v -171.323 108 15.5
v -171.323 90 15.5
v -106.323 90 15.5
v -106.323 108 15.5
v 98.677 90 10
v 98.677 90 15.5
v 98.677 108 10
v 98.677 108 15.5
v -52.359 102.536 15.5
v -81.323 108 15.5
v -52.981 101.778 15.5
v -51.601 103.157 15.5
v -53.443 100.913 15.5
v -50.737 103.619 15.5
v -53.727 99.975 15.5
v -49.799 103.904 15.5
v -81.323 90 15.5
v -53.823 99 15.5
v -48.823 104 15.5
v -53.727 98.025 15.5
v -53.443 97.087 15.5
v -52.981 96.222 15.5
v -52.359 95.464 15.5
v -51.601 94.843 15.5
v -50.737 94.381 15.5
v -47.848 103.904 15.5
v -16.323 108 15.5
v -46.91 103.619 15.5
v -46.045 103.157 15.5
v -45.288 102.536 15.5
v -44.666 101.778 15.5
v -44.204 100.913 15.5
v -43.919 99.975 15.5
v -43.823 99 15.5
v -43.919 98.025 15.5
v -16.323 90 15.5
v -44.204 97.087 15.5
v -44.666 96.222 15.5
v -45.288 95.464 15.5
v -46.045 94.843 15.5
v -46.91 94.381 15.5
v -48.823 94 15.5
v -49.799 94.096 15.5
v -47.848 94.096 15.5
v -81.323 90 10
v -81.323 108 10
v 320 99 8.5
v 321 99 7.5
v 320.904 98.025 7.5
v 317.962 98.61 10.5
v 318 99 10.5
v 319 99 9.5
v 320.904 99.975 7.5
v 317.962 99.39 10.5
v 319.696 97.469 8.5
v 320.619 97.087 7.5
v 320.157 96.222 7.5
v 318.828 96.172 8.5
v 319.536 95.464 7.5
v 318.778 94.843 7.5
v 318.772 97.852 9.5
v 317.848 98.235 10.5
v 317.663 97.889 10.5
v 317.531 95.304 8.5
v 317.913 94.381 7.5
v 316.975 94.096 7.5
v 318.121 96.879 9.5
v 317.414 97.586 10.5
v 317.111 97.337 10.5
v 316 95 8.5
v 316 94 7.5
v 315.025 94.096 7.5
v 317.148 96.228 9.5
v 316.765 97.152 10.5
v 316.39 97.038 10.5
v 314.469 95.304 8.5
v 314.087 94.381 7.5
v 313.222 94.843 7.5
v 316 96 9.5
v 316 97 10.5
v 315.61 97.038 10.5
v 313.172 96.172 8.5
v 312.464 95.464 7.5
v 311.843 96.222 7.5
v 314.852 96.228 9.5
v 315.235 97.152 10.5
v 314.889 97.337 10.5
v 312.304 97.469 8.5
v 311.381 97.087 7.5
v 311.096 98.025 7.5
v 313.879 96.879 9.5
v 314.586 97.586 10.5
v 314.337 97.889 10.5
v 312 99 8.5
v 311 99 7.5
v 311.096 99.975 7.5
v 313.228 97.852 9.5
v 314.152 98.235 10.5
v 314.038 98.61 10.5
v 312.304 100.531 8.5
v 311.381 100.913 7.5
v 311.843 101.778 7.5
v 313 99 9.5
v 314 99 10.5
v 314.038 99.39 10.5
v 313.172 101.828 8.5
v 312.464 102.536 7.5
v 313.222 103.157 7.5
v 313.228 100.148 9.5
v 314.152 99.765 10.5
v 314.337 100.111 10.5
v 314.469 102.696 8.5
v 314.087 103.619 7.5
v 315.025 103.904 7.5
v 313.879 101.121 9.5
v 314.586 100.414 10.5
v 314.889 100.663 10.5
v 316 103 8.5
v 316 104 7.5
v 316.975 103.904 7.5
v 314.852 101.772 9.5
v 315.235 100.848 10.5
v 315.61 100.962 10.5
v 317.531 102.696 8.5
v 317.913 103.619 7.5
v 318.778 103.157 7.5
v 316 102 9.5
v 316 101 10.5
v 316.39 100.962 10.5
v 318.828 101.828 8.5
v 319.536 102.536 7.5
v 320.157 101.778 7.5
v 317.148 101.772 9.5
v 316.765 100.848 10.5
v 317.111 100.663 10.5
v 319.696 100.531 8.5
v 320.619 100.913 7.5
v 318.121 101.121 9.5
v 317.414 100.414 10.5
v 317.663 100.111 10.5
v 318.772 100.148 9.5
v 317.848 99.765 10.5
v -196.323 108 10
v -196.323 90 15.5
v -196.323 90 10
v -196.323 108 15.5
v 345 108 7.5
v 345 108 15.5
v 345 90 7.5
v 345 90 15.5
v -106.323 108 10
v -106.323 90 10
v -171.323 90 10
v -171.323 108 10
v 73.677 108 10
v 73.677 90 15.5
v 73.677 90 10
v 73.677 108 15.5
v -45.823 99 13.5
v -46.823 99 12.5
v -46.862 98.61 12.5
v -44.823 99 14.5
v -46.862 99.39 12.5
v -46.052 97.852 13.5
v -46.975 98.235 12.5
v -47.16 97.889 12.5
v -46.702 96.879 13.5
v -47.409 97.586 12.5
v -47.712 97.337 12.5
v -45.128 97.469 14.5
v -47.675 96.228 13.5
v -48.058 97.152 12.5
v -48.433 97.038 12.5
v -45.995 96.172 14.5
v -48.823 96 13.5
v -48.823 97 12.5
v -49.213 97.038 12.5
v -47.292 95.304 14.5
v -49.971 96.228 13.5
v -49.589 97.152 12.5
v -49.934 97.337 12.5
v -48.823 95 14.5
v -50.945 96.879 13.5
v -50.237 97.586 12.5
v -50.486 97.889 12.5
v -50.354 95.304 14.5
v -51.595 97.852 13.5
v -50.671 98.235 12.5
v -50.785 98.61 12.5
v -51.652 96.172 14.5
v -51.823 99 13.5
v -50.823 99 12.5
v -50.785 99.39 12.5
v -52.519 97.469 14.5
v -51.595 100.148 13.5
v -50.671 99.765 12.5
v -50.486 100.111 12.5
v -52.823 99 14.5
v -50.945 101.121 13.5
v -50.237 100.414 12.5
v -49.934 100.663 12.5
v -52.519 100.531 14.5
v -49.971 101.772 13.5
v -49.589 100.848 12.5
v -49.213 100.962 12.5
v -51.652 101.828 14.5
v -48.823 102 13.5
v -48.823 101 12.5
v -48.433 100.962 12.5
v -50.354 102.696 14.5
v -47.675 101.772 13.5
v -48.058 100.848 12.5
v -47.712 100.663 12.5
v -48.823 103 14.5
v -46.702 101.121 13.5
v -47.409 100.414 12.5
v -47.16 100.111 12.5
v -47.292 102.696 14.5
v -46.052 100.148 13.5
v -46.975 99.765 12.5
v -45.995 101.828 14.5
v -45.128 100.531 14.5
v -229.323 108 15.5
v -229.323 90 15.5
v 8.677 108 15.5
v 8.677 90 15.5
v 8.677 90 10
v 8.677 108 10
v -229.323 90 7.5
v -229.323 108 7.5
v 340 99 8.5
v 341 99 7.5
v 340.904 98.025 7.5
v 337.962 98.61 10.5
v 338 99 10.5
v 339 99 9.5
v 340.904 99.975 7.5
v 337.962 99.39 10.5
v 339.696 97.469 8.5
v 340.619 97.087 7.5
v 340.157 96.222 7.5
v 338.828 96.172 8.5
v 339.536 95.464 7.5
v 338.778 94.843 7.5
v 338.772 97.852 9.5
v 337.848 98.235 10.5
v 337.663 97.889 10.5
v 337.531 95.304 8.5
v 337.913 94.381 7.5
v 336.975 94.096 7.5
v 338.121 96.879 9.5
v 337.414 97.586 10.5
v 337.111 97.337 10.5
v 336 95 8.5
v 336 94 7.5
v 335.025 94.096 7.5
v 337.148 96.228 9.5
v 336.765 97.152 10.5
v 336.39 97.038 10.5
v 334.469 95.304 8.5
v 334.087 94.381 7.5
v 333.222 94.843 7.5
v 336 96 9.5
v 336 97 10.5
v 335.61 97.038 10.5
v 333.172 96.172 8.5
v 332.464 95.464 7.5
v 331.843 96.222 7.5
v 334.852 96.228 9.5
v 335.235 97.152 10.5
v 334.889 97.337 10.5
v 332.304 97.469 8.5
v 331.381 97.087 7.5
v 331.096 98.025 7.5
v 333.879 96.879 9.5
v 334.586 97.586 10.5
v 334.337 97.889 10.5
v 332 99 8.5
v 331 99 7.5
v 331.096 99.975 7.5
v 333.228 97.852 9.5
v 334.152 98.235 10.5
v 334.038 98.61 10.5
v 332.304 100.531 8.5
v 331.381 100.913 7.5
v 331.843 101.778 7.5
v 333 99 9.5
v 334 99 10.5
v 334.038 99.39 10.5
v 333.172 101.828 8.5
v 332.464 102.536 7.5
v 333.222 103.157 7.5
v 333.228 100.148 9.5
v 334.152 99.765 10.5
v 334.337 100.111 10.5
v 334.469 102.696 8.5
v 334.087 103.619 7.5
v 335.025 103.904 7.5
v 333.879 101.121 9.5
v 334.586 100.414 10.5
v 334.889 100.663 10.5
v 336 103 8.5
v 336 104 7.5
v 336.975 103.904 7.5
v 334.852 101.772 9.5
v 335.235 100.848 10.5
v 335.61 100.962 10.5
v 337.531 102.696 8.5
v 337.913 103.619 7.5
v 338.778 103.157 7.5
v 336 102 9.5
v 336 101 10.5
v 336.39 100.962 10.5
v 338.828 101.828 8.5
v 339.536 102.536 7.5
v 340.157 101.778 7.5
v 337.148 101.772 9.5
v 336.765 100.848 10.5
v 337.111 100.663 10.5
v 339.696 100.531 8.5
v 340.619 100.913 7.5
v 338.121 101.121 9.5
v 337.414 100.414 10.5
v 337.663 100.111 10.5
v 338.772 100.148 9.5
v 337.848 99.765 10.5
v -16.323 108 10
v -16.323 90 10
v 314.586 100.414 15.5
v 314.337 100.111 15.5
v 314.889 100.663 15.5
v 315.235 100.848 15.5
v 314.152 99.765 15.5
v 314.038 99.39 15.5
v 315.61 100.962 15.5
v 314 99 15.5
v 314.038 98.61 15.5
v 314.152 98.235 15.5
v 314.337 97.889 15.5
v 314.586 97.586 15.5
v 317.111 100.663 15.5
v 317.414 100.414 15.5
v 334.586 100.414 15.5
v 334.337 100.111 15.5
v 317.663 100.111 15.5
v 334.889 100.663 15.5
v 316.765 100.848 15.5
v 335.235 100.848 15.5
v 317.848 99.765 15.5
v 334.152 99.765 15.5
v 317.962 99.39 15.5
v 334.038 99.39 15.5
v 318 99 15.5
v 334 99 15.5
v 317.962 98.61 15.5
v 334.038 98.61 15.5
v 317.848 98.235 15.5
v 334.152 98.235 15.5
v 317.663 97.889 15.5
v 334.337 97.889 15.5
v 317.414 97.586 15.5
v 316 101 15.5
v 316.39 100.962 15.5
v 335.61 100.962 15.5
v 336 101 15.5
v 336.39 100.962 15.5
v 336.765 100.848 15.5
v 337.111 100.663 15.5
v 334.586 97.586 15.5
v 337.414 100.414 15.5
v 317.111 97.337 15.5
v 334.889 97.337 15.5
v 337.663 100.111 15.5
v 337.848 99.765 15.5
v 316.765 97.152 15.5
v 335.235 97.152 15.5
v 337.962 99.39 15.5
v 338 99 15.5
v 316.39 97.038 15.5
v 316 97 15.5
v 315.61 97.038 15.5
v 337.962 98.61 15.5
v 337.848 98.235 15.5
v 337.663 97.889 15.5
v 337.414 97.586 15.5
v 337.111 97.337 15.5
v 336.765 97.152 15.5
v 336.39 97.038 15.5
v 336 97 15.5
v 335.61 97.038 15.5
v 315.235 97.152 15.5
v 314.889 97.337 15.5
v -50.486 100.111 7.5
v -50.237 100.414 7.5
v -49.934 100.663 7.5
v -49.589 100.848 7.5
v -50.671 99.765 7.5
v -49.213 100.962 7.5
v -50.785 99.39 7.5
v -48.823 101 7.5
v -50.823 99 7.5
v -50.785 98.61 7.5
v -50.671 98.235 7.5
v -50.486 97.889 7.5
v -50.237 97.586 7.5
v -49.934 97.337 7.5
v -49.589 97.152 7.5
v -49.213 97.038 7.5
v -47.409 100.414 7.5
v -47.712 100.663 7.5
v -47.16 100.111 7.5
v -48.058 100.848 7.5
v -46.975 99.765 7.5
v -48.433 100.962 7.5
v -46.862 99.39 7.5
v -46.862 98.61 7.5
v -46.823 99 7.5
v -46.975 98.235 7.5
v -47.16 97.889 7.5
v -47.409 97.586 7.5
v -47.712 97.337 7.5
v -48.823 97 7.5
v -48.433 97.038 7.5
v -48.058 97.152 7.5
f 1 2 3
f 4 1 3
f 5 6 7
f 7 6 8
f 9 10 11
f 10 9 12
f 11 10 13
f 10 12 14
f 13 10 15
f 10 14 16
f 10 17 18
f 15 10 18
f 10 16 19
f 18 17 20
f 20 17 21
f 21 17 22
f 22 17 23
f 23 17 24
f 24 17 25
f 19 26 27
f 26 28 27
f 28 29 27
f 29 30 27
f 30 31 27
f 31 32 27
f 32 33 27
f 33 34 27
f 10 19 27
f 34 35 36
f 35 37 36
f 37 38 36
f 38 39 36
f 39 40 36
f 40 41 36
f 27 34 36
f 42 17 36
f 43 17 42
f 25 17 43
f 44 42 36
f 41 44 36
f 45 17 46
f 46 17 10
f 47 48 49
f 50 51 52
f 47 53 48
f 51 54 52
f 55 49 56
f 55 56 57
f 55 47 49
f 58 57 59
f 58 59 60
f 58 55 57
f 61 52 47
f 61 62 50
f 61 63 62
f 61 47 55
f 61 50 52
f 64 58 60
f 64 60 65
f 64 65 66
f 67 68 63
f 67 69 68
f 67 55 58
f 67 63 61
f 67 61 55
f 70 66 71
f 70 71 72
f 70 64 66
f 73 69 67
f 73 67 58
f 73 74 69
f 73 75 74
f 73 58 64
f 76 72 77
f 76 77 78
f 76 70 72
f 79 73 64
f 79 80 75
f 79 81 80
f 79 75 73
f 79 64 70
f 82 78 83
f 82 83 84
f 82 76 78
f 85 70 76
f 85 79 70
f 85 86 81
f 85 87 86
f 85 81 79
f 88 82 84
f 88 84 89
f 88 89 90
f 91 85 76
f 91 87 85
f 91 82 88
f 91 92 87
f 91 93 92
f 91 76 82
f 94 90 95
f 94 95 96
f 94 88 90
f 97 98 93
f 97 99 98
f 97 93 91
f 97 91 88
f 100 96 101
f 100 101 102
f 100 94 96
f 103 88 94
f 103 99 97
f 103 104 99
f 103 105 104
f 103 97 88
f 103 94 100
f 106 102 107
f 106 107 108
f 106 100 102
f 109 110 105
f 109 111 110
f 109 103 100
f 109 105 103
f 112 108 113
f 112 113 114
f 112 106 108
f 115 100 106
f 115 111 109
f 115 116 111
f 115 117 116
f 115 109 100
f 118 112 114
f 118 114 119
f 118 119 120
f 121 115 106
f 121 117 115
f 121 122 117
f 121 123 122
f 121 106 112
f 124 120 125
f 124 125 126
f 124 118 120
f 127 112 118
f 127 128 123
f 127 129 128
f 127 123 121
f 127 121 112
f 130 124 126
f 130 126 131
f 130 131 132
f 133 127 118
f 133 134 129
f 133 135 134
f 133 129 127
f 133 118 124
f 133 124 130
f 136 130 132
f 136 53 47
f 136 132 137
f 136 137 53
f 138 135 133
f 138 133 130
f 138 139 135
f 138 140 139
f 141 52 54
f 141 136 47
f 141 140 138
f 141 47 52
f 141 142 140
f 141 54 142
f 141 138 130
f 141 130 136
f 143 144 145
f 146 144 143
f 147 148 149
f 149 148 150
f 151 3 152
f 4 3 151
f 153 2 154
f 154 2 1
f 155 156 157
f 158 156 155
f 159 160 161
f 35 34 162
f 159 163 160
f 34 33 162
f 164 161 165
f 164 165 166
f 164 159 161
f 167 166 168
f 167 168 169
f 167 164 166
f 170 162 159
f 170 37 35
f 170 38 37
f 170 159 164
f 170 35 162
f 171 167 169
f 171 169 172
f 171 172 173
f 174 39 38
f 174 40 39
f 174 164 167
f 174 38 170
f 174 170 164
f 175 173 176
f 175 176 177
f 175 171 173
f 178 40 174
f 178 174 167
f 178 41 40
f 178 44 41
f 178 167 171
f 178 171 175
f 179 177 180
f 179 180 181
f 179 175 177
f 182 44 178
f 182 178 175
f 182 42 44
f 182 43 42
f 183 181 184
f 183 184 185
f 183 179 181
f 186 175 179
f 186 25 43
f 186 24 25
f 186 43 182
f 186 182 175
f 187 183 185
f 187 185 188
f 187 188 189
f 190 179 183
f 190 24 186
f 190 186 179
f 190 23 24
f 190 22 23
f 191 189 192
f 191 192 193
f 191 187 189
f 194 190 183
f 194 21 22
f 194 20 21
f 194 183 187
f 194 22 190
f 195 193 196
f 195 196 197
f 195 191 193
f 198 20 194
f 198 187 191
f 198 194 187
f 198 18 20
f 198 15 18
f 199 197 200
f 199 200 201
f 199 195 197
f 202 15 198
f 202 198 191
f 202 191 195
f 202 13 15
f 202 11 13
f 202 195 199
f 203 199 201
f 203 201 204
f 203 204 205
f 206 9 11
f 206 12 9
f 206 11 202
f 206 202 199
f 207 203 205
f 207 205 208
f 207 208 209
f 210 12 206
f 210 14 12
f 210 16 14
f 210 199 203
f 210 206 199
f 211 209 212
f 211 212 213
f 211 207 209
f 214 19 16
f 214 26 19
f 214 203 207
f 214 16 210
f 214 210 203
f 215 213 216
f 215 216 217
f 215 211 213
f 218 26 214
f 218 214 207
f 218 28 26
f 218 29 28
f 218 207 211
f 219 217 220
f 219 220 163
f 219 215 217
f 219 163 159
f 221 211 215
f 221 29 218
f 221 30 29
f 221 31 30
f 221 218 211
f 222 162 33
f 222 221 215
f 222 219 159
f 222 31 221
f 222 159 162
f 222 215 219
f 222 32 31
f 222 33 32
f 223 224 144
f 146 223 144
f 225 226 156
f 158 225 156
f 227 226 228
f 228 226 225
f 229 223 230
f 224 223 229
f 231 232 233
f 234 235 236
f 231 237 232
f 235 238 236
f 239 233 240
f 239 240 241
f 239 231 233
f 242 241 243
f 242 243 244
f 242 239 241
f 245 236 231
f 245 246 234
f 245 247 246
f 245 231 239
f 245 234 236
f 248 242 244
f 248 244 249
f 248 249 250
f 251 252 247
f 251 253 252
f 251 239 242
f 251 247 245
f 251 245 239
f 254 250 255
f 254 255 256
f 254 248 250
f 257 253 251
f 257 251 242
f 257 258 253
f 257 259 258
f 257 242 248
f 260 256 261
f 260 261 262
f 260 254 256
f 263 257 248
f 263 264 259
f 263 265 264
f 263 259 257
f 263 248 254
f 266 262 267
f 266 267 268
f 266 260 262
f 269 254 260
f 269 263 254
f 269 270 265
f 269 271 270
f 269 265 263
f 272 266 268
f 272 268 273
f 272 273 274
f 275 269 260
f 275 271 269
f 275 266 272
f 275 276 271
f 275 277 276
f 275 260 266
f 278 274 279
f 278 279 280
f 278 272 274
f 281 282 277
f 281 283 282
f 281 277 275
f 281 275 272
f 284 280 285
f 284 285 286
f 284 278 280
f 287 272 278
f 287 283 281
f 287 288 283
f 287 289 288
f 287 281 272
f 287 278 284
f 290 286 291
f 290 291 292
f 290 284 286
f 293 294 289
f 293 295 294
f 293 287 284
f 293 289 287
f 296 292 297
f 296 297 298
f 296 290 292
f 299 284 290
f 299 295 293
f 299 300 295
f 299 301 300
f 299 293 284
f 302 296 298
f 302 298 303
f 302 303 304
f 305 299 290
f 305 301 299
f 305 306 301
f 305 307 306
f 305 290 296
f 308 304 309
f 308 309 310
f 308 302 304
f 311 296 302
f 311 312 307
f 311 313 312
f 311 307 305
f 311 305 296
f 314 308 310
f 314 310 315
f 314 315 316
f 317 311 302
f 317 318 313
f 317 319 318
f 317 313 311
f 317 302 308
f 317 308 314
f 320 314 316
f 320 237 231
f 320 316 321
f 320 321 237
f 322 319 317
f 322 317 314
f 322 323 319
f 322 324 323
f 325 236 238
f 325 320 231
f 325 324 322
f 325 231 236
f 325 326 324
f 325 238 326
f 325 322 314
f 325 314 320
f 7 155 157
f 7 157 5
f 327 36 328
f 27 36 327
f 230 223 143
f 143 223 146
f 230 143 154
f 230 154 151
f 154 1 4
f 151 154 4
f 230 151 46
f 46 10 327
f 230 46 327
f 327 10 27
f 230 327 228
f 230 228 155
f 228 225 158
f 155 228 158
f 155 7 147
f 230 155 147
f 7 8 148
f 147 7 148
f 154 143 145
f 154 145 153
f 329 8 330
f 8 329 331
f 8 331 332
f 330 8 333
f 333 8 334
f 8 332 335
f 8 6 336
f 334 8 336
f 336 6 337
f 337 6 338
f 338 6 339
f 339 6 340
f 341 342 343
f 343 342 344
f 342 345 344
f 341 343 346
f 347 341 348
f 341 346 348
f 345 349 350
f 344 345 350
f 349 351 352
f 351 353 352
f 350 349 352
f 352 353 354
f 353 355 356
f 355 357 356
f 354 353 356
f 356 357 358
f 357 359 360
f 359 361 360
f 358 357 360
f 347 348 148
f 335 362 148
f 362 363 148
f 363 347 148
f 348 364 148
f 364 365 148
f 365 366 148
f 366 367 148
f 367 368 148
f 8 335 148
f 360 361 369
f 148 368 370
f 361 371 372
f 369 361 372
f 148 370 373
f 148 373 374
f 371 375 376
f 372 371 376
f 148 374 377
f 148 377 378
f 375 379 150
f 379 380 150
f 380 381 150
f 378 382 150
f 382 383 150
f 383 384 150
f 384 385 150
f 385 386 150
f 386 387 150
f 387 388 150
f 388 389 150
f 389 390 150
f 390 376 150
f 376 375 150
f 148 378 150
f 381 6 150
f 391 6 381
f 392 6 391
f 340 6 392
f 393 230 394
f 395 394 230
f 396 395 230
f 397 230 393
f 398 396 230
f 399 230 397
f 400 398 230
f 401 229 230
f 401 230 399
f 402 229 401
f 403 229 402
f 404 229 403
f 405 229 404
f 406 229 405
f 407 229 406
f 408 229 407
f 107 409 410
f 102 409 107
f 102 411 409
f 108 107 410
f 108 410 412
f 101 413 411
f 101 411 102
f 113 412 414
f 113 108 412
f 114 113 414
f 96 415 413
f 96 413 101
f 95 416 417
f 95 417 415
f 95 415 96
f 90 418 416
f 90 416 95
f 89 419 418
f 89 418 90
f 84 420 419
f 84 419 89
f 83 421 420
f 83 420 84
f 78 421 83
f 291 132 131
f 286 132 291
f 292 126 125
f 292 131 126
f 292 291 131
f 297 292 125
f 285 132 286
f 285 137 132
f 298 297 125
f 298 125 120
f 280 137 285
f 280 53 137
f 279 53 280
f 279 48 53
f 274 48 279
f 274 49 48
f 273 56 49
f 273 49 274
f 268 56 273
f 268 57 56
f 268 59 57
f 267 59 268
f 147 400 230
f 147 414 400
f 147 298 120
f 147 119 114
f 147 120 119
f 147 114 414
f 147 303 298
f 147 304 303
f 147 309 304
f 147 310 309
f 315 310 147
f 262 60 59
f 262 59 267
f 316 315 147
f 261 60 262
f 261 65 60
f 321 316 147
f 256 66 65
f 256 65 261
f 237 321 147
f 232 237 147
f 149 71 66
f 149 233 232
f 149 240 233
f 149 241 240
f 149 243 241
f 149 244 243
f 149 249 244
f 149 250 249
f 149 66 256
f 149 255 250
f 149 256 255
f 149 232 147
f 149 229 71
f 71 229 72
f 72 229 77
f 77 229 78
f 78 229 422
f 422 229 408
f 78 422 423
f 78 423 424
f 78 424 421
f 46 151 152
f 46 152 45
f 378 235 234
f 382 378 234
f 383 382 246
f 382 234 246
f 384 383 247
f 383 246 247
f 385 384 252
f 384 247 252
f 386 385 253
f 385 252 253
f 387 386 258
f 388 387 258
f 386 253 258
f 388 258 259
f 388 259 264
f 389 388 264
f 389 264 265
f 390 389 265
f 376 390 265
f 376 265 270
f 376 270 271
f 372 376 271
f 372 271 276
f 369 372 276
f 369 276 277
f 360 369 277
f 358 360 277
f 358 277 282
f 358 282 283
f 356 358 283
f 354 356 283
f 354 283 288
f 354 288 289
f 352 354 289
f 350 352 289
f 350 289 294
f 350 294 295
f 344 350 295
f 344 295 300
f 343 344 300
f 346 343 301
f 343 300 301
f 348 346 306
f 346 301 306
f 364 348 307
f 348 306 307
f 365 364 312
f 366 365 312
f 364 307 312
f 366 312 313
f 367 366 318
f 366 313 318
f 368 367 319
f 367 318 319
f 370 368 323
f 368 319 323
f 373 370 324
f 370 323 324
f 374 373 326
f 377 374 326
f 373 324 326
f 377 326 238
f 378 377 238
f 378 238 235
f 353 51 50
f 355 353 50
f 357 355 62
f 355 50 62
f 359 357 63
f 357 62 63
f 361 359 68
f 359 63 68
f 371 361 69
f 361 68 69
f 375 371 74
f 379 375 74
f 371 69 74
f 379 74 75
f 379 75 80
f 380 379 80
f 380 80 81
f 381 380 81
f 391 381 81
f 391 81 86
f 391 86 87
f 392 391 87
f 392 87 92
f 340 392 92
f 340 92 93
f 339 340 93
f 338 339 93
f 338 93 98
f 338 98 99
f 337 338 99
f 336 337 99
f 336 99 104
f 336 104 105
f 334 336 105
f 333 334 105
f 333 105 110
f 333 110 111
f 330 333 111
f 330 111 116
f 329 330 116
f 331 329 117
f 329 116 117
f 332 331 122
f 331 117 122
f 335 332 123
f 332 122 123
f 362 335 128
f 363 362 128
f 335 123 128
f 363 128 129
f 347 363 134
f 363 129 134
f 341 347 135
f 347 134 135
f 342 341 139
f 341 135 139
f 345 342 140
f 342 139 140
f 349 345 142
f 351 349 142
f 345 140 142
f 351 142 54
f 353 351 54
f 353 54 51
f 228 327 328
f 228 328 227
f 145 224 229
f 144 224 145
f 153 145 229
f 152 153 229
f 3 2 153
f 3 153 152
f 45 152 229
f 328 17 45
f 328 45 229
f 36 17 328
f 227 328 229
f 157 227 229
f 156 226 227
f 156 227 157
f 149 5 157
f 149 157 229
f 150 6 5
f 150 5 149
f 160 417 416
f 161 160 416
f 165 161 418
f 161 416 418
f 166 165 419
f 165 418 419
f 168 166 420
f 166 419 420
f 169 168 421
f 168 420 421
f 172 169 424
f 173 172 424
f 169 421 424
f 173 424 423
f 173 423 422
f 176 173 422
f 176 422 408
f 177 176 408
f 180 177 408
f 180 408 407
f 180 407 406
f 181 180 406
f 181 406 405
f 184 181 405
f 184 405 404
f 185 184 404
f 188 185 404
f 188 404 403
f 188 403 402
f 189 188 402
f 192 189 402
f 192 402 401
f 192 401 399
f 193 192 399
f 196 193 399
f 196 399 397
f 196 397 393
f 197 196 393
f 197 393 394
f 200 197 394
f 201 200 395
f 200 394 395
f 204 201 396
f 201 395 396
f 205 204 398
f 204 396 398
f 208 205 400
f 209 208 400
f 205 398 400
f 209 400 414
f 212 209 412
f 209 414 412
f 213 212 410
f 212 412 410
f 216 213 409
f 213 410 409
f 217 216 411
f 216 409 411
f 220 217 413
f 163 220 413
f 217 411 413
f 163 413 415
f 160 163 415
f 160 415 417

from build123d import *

# Parameters (mm, degrees)
SKETCH044_W             = 574.323184
SKETCH044_H             = 18
PAD022_DEPTH            = 8
SKETCH049_R             = 2
POCKET031_DEPTH         = 8.001
CHAMFER017_SIZE         = 3
SKETCH050_W             = 25
SKETCH050_H             = 18
POCKET032_DEPTH         = 5.5
SKETCH070_R             = 2
POCKET045_DEPTH         = 8.001
CHAMFER029_SIZE         = 3
BODY016_PLACEMENT_ANGLE = 180


with BuildPart() as part:
    # Sketch044 → Pad022 (new body)
    with BuildSketch(Plane.XY):
        with Locations((57.838408, -99)):
            Rectangle(SKETCH044_W, SKETCH044_H)
    extrude(amount=PAD022_DEPTH)

    # Sketch049 (on Face6 of Pad022) → Pocket031 (cut, through all)
    with BuildSketch(Plane.XY.offset(8)):
        with Locations((316, -99)):
            Circle(SKETCH049_R)
        with Locations((336, -99)):
            Circle(SKETCH049_R)
    extrude(amount=-POCKET031_DEPTH, mode=Mode.SUBTRACT)

    # Chamfer017
    chamfer017_edges = [part.edges().sort_by_distance(p)[0] for p in [
        (334, -99, 8),
        (314, -99, 8),
    ]]
    chamfer(chamfer017_edges, length=CHAMFER017_SIZE)

    # Sketch050 (on Face9 of Chamfer017) → Pocket032 (cut)
    with BuildSketch(Plane(origin=(0, 0, 0), x_dir=(1, 0, 0), z_dir=(0, 0, -1))):
        with Locations((-183.823184, 99)):
            Rectangle(SKETCH050_W, SKETCH050_H)
        with Locations((-93.823184, 99)):
            Rectangle(SKETCH050_W, SKETCH050_H)
        with Locations((-3.823184, 99)):
            Rectangle(SKETCH050_W, SKETCH050_H)
        with Locations((86.176816, 99)):
            Rectangle(SKETCH050_W, SKETCH050_H)
    extrude(amount=-POCKET032_DEPTH, mode=Mode.SUBTRACT)

    # Sketch070 (on Face1 of Pocket032) → Pocket045 (cut, through all)
    with BuildSketch(Plane.XY.offset(8)):
        with Locations((-48.823184, -99)):
            Circle(SKETCH070_R)
    extrude(amount=-POCKET045_DEPTH, mode=Mode.SUBTRACT)

    # Chamfer029
    chamfer029_edges = [part.edges().sort_by_distance(p)[0] for p in [
        (-50.823184, -99, 0),
    ]]
    chamfer(chamfer029_edges, length=CHAMFER029_SIZE)


with BuildPart() as part_1:
    # Body016 placement: moved
    add(part.part.moved(Location((0, 0, 15.5))).rotate(Axis((0, 0, 15.5), (1, 0, 0)), BODY016_PLACEMENT_ANGLE))


solid = part_1.part
